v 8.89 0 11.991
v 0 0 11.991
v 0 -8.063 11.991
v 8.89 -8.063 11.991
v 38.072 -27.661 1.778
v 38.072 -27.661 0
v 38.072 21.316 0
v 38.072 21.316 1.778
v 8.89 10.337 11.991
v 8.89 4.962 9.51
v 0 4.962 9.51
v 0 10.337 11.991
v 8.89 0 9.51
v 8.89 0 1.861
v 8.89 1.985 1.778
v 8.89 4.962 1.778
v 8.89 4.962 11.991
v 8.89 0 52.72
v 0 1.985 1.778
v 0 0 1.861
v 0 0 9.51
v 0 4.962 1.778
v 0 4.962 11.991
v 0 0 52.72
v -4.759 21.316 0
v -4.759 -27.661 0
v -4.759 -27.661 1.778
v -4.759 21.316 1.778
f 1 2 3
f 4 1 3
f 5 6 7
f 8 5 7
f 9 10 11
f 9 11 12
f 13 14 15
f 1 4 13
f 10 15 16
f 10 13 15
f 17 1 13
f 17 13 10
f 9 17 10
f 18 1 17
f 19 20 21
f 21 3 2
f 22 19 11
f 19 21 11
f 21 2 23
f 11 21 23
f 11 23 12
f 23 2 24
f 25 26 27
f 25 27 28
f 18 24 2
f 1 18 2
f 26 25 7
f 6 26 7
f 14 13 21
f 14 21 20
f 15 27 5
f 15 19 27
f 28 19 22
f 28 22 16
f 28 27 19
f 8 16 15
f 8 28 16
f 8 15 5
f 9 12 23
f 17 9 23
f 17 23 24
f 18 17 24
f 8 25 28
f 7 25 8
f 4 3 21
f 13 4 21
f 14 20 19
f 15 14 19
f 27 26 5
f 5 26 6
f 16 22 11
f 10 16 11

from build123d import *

# Parameters (mm, degrees)
F1_W     = 42.8306325339
F1_H     = 48.977623228
F2_DEPTH = 1.778
F0_W     = 4.9618608318
F0_H     = 2.4809306487
F3_DEPTH = 8.89


with BuildPart() as f2:
    # F1 (on Top) → F2 (new body)
    with BuildSketch(Plane.XY):
        with Locations((16.6563570965, -3.1726385932)):
            Rectangle(F1_W, F1_H)
    extrude(amount=F2_DEPTH)

    # F0 (on Right) → F3 (join)
    with BuildSketch(Plane.YZ):
        Polygon((4.9618608318, 11.9911627844), (0, 52.7197681367), (0, 11.9911627844), align=None)
        with Locations((2.4809304159, 10.75069746)):
            Rectangle(F0_W, F0_H)
        Polygon((10.337209329, 11.9911627844), (4.9618608318, 11.9911627844), (4.9618608318, 9.5102321357), align=None)
        Polygon((0, 9.5102321357), (0, 11.9911627844), (-8.0630229786, 11.9911627844), align=None)
        Polygon((4.9618608318, 1.6539535718), (4.9618608318, 9.5102321357), (0, 9.5102321357), (0, 1.8606976373), align=None)
    extrude(amount=F3_DEPTH)


solid = f2.part
